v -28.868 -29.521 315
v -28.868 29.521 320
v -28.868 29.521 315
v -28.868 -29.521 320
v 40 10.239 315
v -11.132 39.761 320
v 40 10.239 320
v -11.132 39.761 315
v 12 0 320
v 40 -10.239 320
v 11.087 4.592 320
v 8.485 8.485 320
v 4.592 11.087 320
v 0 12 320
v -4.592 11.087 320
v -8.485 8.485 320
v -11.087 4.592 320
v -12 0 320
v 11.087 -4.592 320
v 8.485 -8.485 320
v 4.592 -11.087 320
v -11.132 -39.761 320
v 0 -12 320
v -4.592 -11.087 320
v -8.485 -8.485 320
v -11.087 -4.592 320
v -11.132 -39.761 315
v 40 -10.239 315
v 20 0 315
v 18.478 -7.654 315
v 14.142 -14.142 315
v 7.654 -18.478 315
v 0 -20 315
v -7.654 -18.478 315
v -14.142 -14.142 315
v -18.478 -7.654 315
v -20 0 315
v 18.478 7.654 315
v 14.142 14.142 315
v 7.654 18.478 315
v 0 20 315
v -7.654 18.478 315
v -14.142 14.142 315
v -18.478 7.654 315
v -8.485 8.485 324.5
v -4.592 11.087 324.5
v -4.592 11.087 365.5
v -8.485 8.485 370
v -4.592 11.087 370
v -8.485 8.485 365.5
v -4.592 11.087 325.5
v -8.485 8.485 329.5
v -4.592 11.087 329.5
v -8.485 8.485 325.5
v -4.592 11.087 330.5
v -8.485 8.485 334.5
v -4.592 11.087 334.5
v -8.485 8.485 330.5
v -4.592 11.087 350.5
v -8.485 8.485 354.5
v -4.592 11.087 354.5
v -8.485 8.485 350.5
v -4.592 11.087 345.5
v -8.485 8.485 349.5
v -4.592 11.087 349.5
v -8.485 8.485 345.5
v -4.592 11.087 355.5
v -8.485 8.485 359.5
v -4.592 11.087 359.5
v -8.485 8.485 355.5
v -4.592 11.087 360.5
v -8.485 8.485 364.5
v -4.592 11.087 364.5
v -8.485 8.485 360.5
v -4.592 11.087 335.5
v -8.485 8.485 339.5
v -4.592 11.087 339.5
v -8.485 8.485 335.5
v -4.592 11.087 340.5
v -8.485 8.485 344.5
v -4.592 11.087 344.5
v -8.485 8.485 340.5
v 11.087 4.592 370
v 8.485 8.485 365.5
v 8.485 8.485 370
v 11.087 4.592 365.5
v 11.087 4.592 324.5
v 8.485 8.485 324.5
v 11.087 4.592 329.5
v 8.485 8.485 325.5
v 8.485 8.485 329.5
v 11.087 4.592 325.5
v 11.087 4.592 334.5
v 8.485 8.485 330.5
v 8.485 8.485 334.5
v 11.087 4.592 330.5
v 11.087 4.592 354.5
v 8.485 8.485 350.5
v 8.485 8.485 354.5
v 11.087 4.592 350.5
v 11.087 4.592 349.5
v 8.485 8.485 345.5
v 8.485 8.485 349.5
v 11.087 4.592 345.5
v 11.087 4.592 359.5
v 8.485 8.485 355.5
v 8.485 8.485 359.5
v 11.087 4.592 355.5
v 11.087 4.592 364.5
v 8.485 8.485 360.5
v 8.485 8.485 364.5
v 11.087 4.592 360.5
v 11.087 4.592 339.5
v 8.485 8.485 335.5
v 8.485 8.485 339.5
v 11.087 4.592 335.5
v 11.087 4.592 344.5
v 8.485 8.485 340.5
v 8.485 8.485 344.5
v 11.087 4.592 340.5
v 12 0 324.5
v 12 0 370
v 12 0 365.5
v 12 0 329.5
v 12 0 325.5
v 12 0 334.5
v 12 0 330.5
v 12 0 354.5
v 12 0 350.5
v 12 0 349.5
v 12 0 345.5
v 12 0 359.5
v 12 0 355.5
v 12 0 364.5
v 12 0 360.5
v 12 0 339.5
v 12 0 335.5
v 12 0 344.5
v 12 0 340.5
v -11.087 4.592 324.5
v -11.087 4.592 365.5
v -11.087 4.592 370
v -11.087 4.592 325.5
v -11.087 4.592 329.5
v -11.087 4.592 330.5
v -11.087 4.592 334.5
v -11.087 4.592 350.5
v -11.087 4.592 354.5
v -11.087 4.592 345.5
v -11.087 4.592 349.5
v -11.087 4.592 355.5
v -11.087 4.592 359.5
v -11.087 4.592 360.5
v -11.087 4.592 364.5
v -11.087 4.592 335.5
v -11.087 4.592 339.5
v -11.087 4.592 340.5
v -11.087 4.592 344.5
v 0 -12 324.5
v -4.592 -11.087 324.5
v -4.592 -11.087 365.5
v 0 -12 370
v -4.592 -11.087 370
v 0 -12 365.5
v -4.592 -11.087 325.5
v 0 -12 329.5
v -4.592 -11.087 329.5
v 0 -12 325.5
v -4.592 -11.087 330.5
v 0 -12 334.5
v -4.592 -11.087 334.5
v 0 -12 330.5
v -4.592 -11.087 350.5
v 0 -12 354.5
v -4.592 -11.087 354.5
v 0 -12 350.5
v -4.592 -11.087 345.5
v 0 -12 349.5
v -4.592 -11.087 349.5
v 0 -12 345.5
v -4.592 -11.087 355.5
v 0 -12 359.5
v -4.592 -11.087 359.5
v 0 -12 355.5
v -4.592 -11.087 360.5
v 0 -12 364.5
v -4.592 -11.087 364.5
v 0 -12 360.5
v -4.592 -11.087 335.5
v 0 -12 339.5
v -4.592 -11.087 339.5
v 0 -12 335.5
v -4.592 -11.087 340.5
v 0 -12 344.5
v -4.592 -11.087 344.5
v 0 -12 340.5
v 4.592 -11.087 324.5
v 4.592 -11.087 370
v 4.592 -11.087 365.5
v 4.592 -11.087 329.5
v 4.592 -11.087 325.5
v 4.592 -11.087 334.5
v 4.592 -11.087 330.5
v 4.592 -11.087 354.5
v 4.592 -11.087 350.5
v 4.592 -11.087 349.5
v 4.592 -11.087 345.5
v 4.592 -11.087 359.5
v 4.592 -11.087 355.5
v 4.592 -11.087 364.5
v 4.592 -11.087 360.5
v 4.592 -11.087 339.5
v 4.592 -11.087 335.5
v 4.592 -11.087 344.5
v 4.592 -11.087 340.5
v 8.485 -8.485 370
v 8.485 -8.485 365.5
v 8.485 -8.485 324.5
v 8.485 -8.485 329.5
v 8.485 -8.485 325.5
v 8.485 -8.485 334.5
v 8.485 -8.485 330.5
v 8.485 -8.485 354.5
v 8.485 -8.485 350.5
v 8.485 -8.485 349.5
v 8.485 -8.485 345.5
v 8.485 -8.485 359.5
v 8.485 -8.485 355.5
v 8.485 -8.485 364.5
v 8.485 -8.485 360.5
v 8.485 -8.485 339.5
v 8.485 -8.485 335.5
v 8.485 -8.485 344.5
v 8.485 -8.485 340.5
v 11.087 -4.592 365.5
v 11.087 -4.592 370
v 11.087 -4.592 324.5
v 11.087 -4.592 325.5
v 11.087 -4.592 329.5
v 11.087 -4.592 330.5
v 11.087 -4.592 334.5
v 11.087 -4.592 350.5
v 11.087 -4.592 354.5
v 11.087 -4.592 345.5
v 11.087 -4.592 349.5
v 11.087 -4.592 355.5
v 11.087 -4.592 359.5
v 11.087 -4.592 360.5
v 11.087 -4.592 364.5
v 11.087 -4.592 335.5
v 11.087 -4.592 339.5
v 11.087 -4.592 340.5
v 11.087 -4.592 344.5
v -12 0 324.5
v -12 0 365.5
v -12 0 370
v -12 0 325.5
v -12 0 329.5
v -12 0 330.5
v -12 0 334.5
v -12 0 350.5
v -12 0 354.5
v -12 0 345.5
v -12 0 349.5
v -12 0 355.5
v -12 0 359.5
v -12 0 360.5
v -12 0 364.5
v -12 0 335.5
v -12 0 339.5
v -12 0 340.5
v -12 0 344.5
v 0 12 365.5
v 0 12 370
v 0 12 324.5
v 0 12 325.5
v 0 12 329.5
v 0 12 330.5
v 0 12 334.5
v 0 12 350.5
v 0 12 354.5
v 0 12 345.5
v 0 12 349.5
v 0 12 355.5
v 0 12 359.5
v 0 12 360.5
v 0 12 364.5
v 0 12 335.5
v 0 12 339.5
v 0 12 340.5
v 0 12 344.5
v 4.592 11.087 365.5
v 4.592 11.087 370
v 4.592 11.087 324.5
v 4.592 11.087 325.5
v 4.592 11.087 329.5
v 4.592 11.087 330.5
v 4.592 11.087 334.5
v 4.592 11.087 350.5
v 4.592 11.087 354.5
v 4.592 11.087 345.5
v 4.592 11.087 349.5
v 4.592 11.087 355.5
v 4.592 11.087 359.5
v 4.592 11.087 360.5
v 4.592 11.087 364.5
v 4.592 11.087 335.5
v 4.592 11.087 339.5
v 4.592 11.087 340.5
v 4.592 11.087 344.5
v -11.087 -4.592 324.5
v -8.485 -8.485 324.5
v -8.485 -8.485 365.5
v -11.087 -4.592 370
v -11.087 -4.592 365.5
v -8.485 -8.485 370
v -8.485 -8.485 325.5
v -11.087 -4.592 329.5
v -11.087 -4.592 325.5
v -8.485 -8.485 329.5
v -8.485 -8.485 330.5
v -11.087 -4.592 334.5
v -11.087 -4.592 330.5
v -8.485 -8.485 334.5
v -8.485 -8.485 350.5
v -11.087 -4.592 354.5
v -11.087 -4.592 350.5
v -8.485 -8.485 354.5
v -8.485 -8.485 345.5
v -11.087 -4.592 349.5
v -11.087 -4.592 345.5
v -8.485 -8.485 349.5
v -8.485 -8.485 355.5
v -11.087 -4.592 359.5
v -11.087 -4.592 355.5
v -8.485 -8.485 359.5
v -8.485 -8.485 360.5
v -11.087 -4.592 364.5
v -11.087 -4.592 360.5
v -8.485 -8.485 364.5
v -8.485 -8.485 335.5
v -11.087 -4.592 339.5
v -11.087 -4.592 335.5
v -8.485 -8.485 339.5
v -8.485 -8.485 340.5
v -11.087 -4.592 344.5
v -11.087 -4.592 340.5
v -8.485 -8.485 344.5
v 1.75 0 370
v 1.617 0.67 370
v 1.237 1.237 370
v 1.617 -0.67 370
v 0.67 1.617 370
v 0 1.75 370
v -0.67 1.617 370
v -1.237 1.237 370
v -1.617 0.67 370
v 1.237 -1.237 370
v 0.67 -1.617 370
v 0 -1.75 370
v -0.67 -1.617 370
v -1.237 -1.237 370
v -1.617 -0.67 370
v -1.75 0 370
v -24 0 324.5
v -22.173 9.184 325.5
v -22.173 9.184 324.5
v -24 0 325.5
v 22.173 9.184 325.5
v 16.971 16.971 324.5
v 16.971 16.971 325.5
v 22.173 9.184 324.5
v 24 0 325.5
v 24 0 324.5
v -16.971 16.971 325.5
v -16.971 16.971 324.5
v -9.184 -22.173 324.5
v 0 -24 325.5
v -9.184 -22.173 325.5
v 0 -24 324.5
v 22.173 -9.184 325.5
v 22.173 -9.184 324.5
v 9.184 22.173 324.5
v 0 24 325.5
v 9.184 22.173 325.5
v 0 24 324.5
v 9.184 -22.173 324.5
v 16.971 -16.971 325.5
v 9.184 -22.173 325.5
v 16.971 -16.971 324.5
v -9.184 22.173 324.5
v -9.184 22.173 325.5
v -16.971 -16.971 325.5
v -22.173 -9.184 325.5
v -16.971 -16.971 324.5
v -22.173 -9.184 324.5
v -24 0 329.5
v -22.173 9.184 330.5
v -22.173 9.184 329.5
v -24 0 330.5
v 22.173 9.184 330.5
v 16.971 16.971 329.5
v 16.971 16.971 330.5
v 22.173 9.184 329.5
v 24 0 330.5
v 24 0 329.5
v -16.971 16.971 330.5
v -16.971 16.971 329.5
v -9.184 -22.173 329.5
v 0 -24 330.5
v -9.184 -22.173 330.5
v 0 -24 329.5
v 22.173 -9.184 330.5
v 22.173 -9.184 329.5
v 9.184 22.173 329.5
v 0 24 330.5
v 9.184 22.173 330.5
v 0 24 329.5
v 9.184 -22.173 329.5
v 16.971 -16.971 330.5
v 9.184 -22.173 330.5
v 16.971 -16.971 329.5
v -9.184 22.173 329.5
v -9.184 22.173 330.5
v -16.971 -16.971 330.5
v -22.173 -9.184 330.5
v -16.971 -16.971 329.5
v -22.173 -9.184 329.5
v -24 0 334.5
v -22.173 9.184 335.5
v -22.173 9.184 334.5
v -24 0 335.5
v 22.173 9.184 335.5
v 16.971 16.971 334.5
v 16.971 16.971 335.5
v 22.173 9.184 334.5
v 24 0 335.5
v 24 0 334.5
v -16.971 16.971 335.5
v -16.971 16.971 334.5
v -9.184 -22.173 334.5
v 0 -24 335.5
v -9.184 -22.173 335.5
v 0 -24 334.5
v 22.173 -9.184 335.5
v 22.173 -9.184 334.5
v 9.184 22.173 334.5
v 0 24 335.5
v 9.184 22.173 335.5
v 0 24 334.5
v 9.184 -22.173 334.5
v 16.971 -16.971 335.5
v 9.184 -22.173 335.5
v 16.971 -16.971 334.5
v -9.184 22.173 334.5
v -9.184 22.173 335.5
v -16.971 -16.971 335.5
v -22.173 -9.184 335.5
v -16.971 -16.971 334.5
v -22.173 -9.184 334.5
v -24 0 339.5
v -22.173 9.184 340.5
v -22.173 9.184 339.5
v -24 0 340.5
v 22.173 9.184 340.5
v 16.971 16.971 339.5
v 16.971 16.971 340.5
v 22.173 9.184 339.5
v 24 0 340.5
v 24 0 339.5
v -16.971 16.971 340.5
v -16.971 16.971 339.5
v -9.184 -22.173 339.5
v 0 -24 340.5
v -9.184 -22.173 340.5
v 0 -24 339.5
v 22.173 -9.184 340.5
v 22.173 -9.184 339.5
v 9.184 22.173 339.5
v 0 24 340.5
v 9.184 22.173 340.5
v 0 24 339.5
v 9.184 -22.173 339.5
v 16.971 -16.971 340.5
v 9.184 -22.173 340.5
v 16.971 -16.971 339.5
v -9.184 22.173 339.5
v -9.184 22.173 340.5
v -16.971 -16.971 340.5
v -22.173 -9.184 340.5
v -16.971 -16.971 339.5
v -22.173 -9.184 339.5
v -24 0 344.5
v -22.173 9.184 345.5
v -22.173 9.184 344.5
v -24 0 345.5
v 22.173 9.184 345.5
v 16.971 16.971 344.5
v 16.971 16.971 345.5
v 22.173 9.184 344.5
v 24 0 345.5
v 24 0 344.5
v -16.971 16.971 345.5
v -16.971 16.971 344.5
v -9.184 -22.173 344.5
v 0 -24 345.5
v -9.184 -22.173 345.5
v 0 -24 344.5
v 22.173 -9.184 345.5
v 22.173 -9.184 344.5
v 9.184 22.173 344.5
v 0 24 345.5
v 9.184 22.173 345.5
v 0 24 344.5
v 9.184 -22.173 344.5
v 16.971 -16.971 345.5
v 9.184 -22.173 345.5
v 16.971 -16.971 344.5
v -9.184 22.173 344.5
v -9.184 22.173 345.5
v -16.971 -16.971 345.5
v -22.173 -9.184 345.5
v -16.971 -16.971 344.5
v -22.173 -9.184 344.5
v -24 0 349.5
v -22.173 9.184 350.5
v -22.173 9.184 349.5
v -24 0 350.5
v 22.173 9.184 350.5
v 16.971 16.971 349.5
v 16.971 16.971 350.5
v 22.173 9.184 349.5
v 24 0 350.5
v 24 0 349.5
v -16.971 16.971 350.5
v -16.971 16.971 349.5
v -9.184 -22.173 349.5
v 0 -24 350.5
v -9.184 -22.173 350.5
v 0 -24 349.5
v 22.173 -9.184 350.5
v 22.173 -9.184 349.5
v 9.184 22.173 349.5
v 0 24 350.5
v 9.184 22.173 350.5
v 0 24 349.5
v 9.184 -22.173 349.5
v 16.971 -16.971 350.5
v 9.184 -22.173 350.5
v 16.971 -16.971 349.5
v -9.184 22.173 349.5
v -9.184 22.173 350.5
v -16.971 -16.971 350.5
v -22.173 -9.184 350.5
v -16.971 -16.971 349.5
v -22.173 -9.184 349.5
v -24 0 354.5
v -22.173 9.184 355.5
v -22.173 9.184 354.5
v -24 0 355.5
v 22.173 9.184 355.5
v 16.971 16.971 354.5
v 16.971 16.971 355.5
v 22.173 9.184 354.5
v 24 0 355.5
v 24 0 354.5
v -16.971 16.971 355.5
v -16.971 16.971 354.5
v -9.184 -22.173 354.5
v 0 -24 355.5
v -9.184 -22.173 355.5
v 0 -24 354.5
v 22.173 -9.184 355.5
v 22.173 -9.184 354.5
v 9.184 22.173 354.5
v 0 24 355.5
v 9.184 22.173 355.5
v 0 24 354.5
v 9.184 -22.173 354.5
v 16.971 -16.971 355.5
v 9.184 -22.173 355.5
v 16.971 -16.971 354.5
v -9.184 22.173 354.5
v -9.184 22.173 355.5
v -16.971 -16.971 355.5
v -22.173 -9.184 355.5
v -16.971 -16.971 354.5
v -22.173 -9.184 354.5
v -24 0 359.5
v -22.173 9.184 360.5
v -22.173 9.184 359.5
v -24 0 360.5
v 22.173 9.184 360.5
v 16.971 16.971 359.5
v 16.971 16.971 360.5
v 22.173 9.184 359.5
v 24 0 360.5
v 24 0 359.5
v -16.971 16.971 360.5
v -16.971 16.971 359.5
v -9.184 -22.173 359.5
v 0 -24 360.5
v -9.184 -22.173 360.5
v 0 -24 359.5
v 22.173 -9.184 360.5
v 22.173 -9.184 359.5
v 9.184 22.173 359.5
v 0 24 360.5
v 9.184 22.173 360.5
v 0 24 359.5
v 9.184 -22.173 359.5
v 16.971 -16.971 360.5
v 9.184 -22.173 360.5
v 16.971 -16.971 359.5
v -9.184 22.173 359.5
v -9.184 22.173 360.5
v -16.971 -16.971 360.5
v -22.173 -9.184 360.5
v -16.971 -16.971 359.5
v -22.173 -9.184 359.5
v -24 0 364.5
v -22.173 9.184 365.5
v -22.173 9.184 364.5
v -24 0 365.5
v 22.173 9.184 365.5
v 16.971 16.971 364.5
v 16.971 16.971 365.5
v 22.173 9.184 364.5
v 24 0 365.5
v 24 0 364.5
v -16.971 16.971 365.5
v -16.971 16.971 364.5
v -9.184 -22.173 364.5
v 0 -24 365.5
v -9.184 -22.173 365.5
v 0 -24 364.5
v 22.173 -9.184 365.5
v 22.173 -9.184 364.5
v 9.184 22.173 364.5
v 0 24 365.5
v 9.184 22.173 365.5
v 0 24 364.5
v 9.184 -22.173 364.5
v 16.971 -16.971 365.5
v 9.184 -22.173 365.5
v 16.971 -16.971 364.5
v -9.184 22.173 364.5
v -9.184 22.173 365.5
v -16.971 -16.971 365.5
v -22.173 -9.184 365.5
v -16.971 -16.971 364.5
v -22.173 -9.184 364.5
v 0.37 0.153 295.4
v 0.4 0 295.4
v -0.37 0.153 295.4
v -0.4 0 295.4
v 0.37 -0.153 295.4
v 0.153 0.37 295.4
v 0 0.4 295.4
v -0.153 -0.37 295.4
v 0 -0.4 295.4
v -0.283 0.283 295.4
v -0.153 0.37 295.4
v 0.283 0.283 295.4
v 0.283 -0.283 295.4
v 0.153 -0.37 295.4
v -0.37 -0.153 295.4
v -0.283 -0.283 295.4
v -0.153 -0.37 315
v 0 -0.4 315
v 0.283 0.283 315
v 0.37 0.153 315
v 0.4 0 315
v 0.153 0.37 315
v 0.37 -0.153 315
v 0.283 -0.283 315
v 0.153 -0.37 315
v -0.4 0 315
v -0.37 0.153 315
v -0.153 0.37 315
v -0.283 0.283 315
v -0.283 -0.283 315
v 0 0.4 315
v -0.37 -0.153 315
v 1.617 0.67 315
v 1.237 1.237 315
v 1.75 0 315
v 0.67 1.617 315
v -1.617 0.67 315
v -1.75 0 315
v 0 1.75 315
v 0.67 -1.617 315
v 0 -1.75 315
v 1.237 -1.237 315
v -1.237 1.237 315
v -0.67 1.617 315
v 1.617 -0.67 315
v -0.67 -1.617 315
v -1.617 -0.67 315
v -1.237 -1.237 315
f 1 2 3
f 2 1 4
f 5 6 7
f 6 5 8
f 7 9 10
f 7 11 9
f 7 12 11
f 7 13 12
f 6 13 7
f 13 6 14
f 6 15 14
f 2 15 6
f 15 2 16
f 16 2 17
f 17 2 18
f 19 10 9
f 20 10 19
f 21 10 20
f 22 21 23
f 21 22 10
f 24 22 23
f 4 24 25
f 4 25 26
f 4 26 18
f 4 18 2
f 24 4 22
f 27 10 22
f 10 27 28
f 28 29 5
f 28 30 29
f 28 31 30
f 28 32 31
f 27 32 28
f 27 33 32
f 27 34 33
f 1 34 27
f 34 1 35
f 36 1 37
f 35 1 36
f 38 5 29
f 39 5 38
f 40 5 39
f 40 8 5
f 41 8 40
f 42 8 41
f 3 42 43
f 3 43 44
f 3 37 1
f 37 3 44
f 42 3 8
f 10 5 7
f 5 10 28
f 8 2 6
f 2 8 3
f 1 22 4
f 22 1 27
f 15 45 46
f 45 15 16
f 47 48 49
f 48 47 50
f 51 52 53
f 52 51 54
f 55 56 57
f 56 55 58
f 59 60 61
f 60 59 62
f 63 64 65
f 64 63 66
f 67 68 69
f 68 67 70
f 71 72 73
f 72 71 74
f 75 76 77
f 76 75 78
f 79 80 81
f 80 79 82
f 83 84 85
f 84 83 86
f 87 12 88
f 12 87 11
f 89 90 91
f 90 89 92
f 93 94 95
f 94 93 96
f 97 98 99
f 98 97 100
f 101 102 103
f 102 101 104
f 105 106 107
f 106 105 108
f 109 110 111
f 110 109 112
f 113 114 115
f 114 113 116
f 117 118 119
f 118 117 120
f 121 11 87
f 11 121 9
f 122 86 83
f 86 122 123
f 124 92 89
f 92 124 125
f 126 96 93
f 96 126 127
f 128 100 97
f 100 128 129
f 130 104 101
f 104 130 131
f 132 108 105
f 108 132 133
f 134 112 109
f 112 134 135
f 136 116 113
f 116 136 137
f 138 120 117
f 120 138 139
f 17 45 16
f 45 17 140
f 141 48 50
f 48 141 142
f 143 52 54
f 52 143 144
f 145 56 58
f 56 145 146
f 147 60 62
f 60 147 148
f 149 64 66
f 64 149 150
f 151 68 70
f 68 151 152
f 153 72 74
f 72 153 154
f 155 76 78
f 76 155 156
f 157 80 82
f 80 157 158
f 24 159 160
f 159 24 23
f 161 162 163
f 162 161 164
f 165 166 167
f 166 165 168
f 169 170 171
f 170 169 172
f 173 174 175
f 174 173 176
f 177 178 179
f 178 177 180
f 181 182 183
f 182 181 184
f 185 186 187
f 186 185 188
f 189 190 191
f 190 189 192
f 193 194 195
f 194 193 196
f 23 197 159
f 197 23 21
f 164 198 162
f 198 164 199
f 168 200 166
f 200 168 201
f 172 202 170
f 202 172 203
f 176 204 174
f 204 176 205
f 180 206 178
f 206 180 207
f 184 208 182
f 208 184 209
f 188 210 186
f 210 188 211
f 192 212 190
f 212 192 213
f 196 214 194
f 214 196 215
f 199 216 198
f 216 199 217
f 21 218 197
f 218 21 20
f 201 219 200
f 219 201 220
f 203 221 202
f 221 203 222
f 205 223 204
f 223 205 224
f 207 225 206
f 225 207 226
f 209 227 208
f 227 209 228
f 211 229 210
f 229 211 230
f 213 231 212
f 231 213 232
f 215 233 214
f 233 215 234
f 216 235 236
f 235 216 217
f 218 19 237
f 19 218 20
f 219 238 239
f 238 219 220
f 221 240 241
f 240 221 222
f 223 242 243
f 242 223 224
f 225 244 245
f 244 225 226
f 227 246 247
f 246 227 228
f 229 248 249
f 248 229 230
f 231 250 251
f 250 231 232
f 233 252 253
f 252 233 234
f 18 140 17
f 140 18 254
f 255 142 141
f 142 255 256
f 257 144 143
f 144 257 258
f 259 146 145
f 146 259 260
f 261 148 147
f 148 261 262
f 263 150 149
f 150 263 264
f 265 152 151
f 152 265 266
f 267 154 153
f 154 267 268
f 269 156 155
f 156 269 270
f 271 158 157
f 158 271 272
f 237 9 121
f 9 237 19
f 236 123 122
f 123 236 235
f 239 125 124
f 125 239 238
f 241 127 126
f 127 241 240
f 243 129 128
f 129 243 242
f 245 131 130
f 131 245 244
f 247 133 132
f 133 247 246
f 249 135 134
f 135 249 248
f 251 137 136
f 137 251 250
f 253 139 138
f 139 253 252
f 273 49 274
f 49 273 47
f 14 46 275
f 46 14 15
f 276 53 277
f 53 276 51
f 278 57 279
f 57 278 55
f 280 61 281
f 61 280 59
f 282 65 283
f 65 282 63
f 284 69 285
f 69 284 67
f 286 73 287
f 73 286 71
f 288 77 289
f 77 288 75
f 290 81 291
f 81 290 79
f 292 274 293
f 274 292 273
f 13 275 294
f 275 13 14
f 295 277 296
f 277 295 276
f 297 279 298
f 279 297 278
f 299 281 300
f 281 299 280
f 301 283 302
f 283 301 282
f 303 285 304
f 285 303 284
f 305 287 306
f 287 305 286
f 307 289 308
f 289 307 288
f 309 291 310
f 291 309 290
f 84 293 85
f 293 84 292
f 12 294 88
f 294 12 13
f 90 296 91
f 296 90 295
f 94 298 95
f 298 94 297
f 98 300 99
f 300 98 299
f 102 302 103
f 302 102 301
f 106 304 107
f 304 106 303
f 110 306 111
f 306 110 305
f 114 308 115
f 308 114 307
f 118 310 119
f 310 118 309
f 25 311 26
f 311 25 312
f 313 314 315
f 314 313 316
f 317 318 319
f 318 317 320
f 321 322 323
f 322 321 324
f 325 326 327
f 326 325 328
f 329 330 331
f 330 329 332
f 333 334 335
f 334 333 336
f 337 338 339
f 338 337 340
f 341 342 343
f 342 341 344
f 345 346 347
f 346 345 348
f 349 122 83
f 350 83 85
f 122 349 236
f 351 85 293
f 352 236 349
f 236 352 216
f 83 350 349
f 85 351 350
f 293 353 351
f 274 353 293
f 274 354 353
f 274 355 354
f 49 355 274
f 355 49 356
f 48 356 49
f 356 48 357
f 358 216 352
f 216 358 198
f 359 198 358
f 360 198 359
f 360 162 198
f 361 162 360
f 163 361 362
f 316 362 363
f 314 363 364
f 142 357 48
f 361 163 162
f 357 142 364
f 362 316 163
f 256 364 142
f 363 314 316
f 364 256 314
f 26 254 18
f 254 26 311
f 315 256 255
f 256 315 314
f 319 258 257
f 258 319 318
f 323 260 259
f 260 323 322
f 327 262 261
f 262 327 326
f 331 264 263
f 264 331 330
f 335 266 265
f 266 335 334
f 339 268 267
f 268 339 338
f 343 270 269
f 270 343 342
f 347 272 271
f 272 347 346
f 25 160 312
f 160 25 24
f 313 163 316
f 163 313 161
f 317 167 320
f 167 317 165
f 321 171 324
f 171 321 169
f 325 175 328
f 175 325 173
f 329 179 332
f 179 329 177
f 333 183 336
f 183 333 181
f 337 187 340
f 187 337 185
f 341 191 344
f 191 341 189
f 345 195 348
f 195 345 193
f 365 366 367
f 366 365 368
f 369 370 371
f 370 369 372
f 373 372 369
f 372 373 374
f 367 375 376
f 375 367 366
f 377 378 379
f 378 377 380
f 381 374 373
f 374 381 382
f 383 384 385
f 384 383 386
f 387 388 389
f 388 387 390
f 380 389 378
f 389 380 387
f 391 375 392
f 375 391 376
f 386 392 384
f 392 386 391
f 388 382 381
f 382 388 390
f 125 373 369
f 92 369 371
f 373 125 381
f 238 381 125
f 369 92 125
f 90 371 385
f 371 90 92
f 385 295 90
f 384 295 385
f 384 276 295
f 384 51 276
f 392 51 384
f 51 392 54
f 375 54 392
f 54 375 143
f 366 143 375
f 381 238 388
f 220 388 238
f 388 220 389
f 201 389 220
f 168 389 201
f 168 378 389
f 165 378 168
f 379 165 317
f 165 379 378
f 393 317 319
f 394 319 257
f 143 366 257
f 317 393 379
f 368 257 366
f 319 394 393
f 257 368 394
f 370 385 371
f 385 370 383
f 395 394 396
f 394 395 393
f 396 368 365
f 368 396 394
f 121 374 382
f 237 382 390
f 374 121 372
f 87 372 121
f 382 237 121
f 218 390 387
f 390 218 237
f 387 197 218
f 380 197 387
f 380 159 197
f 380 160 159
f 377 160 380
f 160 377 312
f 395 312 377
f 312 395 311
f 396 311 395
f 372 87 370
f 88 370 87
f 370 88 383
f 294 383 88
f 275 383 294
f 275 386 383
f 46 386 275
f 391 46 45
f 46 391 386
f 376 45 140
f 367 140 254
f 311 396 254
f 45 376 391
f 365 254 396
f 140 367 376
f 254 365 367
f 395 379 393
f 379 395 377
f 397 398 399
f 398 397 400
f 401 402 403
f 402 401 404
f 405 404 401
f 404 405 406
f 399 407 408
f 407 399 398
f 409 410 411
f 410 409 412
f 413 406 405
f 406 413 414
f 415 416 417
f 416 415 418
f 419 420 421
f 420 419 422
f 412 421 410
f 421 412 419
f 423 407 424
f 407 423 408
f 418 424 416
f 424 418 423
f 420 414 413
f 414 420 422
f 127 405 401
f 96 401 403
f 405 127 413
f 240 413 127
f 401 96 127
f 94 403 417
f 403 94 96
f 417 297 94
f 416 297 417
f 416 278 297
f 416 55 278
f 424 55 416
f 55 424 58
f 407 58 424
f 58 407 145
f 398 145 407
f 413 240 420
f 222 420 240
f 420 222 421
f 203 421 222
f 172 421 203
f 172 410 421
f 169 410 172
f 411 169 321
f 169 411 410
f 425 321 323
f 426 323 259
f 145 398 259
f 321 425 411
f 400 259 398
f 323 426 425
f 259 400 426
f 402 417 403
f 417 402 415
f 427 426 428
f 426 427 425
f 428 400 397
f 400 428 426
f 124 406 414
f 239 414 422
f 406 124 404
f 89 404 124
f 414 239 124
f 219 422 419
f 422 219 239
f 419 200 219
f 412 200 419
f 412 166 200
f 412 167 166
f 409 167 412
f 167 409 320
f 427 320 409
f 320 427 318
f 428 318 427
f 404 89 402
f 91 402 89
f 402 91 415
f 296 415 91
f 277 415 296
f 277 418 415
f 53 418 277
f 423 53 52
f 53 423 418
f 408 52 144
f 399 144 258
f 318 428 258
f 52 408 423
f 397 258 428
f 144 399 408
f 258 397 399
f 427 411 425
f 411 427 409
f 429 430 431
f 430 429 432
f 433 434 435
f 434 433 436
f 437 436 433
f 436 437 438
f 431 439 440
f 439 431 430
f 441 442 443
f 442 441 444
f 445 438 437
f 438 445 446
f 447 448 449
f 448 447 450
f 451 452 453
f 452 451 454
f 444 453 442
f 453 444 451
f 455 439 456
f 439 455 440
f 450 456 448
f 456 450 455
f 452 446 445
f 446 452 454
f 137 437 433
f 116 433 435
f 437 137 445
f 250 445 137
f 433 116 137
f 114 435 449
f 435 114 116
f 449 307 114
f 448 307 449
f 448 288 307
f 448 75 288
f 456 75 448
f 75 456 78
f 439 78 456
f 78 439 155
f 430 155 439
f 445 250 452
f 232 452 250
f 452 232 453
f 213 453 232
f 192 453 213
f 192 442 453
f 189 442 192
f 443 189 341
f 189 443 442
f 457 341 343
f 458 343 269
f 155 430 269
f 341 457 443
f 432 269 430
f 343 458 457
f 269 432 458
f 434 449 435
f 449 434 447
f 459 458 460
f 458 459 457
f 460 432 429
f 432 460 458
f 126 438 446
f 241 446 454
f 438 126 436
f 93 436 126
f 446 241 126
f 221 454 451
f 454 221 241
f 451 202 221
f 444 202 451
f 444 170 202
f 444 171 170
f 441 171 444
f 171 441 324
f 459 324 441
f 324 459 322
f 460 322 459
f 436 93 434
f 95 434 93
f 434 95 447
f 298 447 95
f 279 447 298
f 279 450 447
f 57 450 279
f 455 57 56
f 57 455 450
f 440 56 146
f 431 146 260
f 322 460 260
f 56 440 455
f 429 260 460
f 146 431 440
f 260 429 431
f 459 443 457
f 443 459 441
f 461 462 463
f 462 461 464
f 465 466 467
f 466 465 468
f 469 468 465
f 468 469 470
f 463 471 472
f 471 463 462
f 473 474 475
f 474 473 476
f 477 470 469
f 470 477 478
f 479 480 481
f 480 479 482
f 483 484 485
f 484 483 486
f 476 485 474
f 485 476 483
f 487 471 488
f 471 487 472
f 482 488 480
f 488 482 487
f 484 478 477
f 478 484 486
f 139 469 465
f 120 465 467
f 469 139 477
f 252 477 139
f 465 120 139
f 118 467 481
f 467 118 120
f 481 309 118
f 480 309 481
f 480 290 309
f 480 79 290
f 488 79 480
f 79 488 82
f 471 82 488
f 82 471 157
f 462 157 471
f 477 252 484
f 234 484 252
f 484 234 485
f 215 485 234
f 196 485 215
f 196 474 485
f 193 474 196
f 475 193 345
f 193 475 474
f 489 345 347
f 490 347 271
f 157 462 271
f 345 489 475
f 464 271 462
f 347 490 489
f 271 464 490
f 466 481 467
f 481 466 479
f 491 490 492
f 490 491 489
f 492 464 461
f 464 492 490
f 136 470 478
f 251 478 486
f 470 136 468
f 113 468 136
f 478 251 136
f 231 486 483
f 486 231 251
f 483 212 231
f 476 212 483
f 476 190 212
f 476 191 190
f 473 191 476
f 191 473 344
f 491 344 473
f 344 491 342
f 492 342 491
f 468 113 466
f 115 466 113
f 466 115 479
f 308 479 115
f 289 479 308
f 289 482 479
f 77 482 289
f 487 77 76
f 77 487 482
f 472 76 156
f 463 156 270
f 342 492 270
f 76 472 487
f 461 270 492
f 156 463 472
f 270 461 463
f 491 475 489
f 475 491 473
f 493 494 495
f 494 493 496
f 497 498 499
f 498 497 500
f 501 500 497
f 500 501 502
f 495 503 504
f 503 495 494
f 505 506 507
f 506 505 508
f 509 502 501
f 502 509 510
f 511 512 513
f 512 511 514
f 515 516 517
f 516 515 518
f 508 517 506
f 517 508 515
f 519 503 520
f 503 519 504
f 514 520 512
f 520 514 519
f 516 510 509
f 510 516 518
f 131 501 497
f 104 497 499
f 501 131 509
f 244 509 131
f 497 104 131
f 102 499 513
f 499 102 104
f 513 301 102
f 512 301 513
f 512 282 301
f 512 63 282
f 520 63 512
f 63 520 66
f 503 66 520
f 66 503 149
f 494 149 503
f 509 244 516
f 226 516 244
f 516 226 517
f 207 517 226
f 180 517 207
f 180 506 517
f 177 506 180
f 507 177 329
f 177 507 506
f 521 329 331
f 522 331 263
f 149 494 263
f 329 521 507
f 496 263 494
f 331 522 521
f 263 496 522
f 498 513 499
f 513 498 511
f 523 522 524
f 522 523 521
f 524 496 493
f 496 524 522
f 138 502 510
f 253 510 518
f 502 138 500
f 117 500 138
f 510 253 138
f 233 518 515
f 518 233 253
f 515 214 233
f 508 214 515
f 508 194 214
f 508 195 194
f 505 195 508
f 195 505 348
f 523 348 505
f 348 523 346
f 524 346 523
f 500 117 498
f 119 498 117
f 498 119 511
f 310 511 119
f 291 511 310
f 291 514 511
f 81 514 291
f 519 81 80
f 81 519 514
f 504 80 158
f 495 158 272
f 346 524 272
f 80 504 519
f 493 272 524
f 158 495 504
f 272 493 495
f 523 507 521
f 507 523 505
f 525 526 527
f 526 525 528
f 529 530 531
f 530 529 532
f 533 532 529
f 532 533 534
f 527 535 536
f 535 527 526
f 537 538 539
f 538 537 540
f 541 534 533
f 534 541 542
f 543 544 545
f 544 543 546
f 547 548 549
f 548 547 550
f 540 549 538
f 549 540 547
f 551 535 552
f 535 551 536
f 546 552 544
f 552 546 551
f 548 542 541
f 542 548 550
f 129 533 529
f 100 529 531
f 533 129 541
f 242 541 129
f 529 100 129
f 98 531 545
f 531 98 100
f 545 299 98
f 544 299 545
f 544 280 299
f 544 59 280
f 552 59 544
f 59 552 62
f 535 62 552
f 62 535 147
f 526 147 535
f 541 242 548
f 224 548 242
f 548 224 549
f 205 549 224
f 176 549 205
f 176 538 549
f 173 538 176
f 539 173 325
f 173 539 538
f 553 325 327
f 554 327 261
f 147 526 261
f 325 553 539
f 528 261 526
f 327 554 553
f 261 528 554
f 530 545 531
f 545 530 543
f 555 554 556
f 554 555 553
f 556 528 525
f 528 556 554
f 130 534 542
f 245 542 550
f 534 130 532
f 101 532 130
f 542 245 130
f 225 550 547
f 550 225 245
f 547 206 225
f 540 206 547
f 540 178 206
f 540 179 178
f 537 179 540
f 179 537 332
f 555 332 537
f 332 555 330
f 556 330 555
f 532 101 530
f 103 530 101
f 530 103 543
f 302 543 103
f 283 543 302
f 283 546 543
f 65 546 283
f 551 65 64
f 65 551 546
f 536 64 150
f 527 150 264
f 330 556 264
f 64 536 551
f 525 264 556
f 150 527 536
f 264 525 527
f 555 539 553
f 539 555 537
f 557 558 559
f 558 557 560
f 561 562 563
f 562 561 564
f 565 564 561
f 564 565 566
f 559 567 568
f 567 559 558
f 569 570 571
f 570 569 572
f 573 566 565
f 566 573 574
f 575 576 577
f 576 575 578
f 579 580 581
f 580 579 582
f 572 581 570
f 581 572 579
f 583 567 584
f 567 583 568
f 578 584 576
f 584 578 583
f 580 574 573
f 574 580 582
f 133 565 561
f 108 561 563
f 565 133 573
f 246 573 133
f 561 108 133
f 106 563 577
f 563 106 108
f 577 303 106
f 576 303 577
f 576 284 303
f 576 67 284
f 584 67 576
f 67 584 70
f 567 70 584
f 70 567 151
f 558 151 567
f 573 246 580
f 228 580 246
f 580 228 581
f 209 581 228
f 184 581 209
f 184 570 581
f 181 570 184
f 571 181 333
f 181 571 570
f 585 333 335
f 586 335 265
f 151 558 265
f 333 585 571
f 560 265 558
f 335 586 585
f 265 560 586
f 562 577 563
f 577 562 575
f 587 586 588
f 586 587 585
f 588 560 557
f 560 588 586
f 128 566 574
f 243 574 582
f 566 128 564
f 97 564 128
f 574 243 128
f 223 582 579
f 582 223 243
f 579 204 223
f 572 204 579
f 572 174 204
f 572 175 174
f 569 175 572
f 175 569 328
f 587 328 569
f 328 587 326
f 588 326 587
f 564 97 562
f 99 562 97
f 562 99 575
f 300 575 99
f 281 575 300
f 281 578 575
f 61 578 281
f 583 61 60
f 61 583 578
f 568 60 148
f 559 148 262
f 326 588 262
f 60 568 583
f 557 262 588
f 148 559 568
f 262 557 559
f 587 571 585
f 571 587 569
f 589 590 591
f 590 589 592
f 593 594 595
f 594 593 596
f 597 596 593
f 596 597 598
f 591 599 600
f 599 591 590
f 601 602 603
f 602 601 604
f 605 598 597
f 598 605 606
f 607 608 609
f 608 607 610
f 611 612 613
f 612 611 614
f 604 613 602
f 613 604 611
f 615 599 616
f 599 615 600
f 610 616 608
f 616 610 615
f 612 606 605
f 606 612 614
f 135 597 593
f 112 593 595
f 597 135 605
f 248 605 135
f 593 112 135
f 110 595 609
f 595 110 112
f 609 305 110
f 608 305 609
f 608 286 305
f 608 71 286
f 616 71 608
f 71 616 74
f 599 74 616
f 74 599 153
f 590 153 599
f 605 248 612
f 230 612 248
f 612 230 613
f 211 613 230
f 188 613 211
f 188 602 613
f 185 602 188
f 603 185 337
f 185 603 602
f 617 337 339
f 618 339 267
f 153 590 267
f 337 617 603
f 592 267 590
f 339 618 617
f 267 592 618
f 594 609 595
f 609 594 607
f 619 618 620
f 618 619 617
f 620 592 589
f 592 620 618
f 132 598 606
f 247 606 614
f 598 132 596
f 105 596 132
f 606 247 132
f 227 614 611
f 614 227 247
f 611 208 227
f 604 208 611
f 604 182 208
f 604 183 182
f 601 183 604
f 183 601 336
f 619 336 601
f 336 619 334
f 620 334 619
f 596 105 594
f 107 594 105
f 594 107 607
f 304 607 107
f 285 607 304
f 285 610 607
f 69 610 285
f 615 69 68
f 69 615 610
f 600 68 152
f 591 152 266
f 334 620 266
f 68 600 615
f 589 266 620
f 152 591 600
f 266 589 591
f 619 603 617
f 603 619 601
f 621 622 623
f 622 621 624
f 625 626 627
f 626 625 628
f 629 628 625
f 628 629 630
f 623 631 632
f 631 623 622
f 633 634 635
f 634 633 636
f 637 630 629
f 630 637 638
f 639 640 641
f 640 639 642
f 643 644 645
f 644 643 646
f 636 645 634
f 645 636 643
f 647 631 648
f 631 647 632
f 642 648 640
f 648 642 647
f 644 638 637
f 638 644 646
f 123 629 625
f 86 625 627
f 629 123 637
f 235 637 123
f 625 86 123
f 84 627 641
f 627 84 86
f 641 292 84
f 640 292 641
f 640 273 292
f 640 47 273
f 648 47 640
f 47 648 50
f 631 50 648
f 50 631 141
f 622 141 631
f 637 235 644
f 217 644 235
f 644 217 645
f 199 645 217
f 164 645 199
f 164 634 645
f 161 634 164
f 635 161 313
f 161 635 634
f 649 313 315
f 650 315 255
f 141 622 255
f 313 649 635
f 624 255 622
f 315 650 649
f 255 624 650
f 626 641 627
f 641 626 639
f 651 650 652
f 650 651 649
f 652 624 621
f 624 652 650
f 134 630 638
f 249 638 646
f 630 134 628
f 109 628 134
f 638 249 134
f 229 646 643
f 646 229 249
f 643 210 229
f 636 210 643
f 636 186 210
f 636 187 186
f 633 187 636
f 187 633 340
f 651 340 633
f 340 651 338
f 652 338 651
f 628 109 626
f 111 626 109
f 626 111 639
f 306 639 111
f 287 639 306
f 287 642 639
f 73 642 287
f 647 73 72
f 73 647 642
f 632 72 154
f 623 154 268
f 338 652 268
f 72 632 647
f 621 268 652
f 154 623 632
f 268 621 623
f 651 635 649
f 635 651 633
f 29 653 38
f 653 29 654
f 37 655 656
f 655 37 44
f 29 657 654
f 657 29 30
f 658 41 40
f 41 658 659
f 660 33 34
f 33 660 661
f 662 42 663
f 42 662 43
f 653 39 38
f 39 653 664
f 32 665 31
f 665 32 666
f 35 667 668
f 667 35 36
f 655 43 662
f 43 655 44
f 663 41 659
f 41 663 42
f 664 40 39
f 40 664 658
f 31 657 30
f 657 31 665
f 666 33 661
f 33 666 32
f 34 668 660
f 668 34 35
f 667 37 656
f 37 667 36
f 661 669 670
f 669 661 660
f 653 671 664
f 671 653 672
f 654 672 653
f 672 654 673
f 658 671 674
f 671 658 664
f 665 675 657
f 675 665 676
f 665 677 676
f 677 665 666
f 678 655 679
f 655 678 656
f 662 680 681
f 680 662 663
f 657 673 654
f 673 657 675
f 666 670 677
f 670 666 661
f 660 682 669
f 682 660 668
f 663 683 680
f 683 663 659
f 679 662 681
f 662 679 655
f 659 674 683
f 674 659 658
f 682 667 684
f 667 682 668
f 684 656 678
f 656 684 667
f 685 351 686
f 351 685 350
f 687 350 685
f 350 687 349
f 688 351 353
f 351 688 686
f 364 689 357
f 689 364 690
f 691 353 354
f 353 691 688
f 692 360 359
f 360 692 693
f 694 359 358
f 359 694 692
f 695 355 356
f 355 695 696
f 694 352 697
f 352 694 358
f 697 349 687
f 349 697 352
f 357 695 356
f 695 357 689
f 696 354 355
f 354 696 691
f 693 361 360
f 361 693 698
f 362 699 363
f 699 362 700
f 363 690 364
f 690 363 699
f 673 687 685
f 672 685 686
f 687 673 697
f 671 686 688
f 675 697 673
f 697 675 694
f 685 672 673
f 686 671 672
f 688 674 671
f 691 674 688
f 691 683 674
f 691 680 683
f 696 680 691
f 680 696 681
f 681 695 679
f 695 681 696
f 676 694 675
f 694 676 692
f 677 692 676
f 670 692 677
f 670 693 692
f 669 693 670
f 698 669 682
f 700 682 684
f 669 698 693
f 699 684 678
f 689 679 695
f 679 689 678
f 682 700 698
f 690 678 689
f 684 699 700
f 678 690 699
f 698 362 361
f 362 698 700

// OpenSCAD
// file: Motor.scad
module Axis (x,y,z) {
    translate ([x,y,z+14.5]) {
        difference () {
            cylinder (r=2.5, h=24, center=true,$fn=8);
            translate ([0,3.5,12]) {
                cube ([4,4,16],center=true);
            }
        }
        translate ([0,0,-12]) {
            cylinder (r=11, h=5, center=true,$fn=16);
        }
    }
}


module 42Motor (x,y,z) {
    translate ([x, y, z]) {
        Axis (0,0,19);
        difference () {
            cube(size=[42.5, 42.5, 38], center=true);
            rotate ([0,0,45]) {
                translate([30,0,0]){
                    cube ([8,8,80],center=true);
                }
            }
            rotate ([0,0,135]) {
                translate([30,0,0]){
                    cube ([8,8,80],center=true);
                }
            }
            rotate ([0,0,-45]) {
                translate([30,0,0]){
                    cube ([8,8,80],center=true);
                }
            }
            rotate ([0,0,-135]) {
                translate([30,0,0]){
                    cube ([8,8,80],center=true);
                }
            }
        }
    }
}
// file: Radiator.scad
module Radiator (x,y,z) {
    translate ([x,y,z]) {
        translate ([0,0,25]){
            cylinder (50,12,12,center=true,$fn=16);
        }
        translate ([0,0,5]){
            cylinder (1,24,24,center=true,$fn=16);
        }
        translate ([0,0,010]){
            cylinder (1,24,24,center=true,$fn=16);
        }
        translate ([0,0,15]){
            cylinder (1,24,24,center=true,$fn=16);
        }
        translate ([0,0,20]){
            cylinder (1,24,24,center=true,$fn=16);
        }
        translate ([0,0,25]){
            cylinder (1,24,24,center=true,$fn=16);
        }
        translate ([0,0,30]){
            cylinder (1,24,24,center=true,$fn=16);
        }
        translate ([0,0,35]){
            cylinder (1,24,24,center=true,$fn=16);
        }
        translate ([0,0,40]){
            cylinder (1,24,24,center=true,$fn=16);
        }
        translate ([0,0,45]){
            cylinder (1,24,24,center=true,$fn=16);
        }
    }
}
// file: Definition.scad
//Three_Prism (hight,edges)
module Three_Prism (hight,edges) {
    in = (edges * (2* sin (60)))/3;
    translate([0, 0, hight/2]) {
        cylinder (hight,in,in,center=true,$fn=3);
    }
}



//Rod (长，外径，内径)
module Rod (length,OD,ID) {
    if (OD > ID) {
        difference () {
            cylinder (length,OD,OD,center=true,$fn=16);
            cylinder (length,ID,ID,center=true,$fn=16);
        }
    }
    else {
        echo ("Err: OD can't less ID ! ! !");
    }
}
// main file
include <Definition.scad>
include <Radiator.scad>
include <Motor.scad>

module Hot_end (x,y,z) {
    translate ([x,y,z]) {
        difference () {
            union () {
                difference () {
                    Three_Prism (5,100);
                    rotate ([0,0,0]) {
                        translate([80,0,0]){
                            rotate ([0,0,0]){
                                cube ([80,80,80],center=true);
                            }
                        }
                    }
                    rotate ([0,0,120]) {
                        translate([80,0,0]){
                            rotate ([0,0,270]){
                                cube ([80,80,80],center=true);
                            }
                        }
                    }
                    rotate ([0,0,240]) {
                        translate([80,0,0]){
                            rotate ([0,0,90]){
                                cube ([80,80,80],center=true);
                            }
                        }
                    }
                }

                Radiator (0,0,5);

                translate ([0,0,-10]) {
                    cylinder (20,0,20,center=true,$fn=16);
                }
            }
            cylinder (200,0.4,0.4,center=true,$fn=16);
            translate ([0, 0, 100]) { 
                cylinder (200,1.75,1.75,center=true,$fn=16);
            }
        }
    }
}


    Hot_end (0,0,315);
